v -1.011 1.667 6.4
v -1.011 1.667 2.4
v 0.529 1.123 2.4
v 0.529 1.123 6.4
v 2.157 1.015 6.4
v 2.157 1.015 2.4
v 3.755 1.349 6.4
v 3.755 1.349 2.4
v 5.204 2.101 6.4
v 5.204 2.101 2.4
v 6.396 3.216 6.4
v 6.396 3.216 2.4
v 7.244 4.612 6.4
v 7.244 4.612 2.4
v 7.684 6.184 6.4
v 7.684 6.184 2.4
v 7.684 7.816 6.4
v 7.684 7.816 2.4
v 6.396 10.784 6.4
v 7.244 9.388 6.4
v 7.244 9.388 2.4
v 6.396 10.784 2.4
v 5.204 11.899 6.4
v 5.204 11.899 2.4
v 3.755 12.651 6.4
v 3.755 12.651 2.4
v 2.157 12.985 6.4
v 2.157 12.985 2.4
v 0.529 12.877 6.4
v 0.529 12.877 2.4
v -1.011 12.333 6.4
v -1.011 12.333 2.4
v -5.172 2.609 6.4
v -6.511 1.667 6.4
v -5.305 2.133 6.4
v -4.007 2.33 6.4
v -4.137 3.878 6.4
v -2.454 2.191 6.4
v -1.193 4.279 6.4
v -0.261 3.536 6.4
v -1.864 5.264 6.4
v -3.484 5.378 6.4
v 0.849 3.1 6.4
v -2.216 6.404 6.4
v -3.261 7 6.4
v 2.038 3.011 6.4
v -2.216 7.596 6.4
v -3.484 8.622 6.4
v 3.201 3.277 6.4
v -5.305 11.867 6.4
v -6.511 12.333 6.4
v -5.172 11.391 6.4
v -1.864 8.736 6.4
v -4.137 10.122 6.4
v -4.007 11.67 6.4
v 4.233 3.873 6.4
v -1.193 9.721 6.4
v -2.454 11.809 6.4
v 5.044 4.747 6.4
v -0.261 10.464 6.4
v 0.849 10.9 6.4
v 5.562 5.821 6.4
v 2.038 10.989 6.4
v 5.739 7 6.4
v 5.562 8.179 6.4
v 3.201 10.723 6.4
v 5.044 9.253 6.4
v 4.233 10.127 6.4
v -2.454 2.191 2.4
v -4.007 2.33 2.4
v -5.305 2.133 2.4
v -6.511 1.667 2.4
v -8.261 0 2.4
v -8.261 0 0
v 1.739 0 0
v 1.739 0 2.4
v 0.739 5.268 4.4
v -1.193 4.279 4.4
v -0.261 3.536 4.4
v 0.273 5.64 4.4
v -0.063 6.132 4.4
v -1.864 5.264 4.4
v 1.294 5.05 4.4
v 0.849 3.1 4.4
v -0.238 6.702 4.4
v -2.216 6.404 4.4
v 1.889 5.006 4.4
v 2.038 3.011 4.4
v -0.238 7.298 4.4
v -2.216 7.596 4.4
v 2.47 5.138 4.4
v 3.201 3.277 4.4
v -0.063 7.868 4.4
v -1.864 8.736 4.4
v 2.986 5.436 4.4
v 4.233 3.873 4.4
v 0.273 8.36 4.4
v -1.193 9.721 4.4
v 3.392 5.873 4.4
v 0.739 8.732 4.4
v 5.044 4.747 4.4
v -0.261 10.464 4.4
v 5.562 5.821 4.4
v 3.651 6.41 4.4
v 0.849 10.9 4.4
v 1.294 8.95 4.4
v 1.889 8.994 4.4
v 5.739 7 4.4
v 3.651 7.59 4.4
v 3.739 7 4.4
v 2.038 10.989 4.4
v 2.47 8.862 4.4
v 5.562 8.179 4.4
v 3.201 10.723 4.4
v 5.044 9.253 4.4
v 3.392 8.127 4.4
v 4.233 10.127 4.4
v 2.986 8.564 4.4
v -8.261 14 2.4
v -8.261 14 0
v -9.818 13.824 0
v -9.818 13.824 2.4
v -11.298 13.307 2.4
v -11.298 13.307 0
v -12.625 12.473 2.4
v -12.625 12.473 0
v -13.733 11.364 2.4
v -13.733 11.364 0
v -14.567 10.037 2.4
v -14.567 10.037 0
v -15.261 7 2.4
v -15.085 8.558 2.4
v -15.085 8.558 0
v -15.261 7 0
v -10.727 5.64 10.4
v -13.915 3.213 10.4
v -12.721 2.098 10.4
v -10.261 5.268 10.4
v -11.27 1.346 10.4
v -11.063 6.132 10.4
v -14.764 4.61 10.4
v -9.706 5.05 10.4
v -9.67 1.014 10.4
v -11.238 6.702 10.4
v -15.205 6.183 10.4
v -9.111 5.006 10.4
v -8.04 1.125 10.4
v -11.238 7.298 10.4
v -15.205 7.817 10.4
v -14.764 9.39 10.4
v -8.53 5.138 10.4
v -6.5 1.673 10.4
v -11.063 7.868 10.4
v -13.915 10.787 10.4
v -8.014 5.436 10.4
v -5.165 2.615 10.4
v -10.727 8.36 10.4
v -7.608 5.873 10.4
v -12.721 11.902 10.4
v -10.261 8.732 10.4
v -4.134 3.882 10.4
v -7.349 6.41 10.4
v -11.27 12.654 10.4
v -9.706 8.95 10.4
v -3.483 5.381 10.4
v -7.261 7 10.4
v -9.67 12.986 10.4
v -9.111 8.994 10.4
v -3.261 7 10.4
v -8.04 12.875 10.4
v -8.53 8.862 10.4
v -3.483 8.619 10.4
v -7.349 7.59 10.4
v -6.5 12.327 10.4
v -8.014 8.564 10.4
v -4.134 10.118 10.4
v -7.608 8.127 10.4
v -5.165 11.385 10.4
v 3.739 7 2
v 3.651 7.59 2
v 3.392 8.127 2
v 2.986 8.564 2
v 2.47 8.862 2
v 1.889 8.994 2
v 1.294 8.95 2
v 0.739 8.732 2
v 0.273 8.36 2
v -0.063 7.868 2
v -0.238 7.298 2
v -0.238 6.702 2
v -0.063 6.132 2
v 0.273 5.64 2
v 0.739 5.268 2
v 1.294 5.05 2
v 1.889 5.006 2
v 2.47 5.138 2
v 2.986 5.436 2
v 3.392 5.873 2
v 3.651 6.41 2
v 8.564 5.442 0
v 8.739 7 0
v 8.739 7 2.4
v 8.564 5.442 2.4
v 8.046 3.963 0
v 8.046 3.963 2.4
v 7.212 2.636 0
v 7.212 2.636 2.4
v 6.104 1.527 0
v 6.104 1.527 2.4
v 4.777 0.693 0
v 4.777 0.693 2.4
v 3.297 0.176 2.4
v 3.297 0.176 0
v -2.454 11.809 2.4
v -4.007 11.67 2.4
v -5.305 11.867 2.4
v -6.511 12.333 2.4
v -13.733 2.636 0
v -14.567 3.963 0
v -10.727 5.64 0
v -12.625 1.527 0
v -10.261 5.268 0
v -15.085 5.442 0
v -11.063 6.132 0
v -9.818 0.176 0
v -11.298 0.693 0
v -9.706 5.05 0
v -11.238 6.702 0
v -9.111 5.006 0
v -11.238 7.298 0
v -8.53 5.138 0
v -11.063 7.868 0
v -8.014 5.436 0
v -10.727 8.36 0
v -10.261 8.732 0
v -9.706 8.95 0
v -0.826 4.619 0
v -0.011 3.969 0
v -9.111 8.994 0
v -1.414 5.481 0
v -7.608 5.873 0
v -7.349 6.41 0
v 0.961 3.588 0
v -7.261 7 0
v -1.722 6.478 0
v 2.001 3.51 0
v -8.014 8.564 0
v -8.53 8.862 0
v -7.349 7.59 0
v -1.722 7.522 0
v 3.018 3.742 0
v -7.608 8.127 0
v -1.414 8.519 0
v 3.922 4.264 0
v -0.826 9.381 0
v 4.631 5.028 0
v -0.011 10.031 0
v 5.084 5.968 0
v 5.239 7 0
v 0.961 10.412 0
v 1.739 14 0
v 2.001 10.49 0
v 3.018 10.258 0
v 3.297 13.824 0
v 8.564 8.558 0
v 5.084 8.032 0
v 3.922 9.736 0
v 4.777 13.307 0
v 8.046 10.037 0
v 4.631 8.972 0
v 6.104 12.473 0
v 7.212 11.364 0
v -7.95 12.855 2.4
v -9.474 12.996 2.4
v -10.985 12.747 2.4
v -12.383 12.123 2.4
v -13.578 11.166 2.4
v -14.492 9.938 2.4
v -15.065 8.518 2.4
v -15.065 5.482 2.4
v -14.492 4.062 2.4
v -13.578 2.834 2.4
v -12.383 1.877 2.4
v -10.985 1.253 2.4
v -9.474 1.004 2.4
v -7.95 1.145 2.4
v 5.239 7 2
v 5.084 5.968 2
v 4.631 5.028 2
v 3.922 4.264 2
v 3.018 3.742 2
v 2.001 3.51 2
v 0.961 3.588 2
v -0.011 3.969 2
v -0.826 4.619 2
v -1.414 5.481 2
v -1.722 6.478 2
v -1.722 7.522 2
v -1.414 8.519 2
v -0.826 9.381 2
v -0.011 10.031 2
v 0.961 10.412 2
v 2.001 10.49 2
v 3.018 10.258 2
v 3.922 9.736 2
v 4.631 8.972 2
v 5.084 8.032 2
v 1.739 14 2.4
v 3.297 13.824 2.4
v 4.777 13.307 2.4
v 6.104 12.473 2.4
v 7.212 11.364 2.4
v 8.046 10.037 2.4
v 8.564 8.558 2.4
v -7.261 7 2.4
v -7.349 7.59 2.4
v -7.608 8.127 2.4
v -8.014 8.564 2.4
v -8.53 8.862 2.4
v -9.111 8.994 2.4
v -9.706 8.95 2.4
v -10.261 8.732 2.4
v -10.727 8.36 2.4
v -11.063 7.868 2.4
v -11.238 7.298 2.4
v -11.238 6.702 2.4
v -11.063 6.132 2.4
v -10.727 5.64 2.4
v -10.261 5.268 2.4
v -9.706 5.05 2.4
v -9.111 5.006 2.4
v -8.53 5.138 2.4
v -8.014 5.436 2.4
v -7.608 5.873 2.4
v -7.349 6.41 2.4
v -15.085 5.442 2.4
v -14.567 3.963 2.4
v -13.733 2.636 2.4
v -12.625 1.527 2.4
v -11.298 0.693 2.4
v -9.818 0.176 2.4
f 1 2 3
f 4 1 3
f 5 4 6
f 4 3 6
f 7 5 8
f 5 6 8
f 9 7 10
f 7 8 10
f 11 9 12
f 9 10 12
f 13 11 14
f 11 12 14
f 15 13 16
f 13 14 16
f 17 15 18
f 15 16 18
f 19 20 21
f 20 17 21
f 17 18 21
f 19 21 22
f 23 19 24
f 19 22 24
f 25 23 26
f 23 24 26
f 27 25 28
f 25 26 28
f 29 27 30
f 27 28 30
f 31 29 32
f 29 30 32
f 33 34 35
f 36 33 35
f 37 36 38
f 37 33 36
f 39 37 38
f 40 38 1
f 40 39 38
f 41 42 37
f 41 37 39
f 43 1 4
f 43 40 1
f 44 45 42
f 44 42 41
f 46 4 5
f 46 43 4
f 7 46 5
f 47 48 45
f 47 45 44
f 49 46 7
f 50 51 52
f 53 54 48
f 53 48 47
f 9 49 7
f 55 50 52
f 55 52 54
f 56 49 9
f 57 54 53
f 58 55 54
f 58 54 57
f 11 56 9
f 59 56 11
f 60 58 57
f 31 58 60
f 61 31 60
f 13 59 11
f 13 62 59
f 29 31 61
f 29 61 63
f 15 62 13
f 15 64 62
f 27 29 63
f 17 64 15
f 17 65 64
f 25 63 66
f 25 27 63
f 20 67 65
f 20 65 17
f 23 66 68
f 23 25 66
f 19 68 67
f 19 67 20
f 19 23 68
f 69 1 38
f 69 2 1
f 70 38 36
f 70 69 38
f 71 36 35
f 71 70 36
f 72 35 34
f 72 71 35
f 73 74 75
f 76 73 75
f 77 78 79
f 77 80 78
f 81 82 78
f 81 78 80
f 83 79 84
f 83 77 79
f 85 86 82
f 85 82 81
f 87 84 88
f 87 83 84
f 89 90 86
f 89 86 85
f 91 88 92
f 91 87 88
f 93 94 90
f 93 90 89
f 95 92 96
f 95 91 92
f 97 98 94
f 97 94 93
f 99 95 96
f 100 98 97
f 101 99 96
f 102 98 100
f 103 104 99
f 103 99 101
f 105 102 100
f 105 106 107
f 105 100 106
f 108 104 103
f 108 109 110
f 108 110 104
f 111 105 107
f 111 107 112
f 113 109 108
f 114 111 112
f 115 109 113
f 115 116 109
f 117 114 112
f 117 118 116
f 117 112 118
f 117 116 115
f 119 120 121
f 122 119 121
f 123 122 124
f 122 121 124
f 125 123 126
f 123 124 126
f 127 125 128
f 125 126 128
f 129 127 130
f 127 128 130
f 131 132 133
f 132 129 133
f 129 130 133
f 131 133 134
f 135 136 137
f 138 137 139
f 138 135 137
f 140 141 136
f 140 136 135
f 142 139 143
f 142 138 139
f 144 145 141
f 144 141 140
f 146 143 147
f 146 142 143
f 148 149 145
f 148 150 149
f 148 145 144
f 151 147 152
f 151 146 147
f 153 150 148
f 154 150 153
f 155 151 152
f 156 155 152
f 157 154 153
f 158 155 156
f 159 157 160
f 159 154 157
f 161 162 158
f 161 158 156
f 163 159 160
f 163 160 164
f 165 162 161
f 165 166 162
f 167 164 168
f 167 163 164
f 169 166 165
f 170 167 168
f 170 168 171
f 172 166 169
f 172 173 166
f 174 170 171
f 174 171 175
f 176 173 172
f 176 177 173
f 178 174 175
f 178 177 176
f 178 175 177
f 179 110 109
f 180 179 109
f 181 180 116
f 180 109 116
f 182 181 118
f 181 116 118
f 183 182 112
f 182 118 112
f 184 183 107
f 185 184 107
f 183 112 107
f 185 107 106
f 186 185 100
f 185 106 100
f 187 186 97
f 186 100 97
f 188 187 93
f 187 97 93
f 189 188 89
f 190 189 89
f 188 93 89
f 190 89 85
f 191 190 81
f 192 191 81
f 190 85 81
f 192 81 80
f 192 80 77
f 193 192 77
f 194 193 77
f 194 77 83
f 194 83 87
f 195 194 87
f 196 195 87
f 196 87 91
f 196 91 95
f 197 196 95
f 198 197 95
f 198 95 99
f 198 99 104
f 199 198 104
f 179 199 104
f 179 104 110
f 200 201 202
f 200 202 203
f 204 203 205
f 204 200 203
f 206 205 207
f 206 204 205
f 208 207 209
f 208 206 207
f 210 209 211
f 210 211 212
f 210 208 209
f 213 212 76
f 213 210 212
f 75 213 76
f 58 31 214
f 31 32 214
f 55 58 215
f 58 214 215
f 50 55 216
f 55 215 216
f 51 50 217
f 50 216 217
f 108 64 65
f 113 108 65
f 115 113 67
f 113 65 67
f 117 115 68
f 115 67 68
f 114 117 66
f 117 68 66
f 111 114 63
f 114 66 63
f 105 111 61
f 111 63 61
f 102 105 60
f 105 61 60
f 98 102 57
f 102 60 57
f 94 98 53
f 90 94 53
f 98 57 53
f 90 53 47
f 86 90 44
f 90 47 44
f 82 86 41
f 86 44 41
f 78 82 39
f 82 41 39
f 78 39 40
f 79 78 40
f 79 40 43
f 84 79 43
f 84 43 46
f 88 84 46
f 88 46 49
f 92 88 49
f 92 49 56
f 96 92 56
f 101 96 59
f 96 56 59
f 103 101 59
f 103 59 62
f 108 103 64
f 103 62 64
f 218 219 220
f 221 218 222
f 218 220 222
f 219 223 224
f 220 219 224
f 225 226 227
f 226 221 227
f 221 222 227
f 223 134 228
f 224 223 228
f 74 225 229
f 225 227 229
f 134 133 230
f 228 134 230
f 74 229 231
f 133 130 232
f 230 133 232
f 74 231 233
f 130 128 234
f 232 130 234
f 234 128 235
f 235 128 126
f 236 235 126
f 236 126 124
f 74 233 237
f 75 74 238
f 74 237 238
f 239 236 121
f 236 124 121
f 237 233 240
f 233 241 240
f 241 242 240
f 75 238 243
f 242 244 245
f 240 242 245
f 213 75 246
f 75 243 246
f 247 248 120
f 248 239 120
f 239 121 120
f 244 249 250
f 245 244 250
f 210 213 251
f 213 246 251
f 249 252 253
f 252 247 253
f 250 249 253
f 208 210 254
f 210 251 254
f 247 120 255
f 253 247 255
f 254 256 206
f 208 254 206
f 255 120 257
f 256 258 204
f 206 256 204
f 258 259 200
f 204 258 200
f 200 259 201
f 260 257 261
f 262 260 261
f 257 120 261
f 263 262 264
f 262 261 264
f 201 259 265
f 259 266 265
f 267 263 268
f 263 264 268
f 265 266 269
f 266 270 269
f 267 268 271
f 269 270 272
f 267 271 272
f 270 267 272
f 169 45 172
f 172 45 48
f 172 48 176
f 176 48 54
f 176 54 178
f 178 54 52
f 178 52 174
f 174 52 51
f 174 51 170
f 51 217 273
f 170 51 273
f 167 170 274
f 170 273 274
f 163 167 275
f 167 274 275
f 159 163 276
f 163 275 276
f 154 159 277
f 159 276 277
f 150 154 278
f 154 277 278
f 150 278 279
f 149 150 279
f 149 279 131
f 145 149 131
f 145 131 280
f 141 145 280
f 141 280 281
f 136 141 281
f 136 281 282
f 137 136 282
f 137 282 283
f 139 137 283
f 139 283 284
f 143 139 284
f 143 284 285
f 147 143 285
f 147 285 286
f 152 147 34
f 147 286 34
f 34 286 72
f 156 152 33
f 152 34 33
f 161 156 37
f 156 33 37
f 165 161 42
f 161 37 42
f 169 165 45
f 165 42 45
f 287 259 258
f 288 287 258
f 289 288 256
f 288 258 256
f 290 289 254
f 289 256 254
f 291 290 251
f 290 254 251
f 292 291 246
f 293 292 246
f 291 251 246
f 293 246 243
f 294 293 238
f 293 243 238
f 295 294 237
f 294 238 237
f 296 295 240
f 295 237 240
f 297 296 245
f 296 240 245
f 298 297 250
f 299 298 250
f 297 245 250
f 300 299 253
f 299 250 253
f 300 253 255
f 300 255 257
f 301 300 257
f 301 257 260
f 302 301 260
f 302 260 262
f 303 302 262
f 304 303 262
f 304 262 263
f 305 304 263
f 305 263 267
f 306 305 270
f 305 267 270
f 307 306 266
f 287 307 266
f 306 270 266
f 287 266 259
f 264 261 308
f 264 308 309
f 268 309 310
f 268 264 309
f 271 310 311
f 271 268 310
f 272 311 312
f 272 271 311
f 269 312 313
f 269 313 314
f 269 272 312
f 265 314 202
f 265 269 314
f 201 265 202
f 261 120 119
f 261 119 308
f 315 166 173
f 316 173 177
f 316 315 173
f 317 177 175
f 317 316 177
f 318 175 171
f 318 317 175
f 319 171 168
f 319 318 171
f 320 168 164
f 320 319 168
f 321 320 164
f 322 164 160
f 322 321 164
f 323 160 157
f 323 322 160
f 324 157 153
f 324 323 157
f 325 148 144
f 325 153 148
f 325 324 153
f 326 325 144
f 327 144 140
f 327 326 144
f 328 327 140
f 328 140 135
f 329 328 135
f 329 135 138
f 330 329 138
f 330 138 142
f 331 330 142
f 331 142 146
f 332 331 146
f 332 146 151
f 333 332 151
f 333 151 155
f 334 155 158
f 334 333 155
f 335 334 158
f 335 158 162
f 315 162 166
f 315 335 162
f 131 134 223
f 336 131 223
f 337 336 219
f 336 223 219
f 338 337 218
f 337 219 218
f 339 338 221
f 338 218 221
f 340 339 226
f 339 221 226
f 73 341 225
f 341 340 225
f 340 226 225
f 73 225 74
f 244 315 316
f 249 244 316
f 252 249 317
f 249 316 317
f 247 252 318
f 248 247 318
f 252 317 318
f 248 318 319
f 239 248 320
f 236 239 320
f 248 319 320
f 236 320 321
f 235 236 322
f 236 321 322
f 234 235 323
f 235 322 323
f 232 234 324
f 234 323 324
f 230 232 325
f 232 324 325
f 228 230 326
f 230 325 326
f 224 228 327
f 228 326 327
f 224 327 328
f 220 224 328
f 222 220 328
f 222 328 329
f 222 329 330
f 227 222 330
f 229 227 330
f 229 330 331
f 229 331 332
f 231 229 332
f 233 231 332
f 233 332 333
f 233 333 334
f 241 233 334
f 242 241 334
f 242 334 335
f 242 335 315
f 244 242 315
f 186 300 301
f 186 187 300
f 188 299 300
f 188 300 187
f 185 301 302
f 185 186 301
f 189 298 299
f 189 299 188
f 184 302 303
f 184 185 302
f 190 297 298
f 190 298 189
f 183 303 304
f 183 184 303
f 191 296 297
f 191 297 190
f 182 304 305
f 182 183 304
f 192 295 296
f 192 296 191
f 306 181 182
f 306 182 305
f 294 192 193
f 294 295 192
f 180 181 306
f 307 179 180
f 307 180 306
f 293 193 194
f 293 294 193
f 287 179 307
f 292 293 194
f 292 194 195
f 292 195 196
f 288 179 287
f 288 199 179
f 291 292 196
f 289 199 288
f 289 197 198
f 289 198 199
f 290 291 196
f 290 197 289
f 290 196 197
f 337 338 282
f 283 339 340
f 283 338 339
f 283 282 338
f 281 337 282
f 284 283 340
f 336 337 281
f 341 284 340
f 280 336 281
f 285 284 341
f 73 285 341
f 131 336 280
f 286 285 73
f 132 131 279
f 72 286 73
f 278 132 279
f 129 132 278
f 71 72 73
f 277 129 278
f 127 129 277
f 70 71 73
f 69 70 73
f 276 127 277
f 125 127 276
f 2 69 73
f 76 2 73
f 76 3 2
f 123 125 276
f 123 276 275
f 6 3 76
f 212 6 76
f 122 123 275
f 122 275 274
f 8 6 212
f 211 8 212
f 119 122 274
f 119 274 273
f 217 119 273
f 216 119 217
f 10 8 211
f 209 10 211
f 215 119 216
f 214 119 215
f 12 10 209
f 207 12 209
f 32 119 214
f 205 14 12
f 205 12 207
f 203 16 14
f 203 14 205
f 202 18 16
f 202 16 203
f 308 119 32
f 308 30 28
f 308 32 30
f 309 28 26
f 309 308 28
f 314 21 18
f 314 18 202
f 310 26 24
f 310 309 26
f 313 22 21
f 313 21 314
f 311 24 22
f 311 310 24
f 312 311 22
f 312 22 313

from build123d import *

# Parameters (mm, degrees)
F0_W          = 24
F0_H          = 14
F1_DEPTH      = 2.4
F3_R          = 6
F4_DEPTH      = 8
F5_R          = 6
F6_DEPTH      = 4
F2_R          = 2
F7_DEPTH      = 2.401
F7_DEPTH_BACK = 8.001
F8_R          = 2
F9_DEPTH      = 6.401
F10_R         = 3.5
F11_DEPTH     = 2
F12_R         = 4
F13_DEPTH     = 2
F14_T1_DEPTH  = 37.4
F15_R         = 6


# Not quite as in the source:
# - a fillet or chamfer that OpenCascade refuses, or shapes differently, is made with other operations: its cross-section is extruded or revolved along the edge and cut away or added


with BuildPart() as f1:
    # F0 (on Top) → F1 (new body)
    with BuildSketch(Plane.XY):
        with Locations((-3.2606057666, 7)):
            Rectangle(F0_W, F0_H)
    extrude(amount=F1_DEPTH)

    # F3 (on face) → F4 (join)
    with BuildSketch(Plane.XY.offset(2.4)):
        with Locations((-9.2606057666, 7)):
            Circle(F3_R)
    extrude(amount=F4_DEPTH)

    # F5 (on face) → F6 (join)
    with BuildSketch(Plane.XY.offset(2.4)):
        with Locations((1.7393942334, 7)):
            Circle(F5_R)
    extrude(amount=F6_DEPTH)

    # F2 (on face) → F7 (cut, two sides)
    with BuildSketch(Plane.XY.offset(2.4)) as f7_sk:
        with Locations((-9.2606057666, 7)):
            Circle(F2_R)
    extrude(amount=-F7_DEPTH, mode=Mode.SUBTRACT)
    extrude(f7_sk.sketch, amount=F7_DEPTH_BACK, mode=Mode.SUBTRACT)

    # F8 (on face) → F9 (cut, through all)
    with BuildSketch(Plane.XY.offset(6.4)):
        with Locations((1.7393942334, 7)):
            Circle(F8_R)
    extrude(amount=-F9_DEPTH, mode=Mode.SUBTRACT)

    # F10 (on face) → F11 (cut)
    with BuildSketch(Plane(origin=(0, 0, 0), x_dir=(1, 0, 0), z_dir=(0, 0, -1))):
        with Locations((1.7393942334, -7)):
            Circle(F10_R)
    extrude(amount=-F11_DEPTH, mode=Mode.SUBTRACT)

    # F12 (on face) → F13 (cut)
    with BuildSketch(Plane.XY.offset(6.4)):
        with Locations((1.7393942334, 7)):
            Circle(F12_R)
    extrude(amount=-F13_DEPTH, mode=Mode.SUBTRACT)

    # F14: fillet of radius 7 on 4 edges, made by hand

    # F14_s2 → F14_t1 (cut)
    with BuildSketch(Plane.XY.offset(-17.5)):
        with BuildLine():
            ThreePointArc((-8.2606057666, 14), (-13.2103532349, 11.9497474683), (-15.2606057666, 7))
            Line((-15.2606057666, 7), (-15.2606057666, 14))
            Line((-15.2606057666, 14), (-8.2606057666, 14))
        make_face()
        with BuildLine():
            ThreePointArc((-15.2606057666, 7), (-13.2103532349, 2.0502525317), (-8.2606057666, 0))
            Line((-8.2606057666, 0), (-15.2606057666, 0))
            Line((-15.2606057666, 0), (-15.2606057666, 7))
        make_face()
        with BuildLine():
            ThreePointArc((8.7393942334, 7), (6.6891417017, 2.0502525317), (1.7393942334, 0))
            Line((1.7393942334, 0), (8.7393942334, 0))
            Line((8.7393942334, 0), (8.7393942334, 7))
        make_face()
        with BuildLine():
            ThreePointArc((1.7393942334, 14), (6.6891417017, 11.9497474683), (8.7393942334, 7))
            Line((8.7393942334, 7), (8.7393942334, 14))
            Line((8.7393942334, 14), (1.7393942334, 14))
        make_face()
    extrude(amount=F14_T1_DEPTH, mode=Mode.SUBTRACT)

    # F15
    f15_edges = [f1.edges().sort_by_distance(p)[0] for p in [
        (-3.760606, 4.602084, 4.4),
        (-3.760606, 9.397916, 4.4),
    ]]
    fillet(f15_edges, radius=F15_R)


solid = f1.part
